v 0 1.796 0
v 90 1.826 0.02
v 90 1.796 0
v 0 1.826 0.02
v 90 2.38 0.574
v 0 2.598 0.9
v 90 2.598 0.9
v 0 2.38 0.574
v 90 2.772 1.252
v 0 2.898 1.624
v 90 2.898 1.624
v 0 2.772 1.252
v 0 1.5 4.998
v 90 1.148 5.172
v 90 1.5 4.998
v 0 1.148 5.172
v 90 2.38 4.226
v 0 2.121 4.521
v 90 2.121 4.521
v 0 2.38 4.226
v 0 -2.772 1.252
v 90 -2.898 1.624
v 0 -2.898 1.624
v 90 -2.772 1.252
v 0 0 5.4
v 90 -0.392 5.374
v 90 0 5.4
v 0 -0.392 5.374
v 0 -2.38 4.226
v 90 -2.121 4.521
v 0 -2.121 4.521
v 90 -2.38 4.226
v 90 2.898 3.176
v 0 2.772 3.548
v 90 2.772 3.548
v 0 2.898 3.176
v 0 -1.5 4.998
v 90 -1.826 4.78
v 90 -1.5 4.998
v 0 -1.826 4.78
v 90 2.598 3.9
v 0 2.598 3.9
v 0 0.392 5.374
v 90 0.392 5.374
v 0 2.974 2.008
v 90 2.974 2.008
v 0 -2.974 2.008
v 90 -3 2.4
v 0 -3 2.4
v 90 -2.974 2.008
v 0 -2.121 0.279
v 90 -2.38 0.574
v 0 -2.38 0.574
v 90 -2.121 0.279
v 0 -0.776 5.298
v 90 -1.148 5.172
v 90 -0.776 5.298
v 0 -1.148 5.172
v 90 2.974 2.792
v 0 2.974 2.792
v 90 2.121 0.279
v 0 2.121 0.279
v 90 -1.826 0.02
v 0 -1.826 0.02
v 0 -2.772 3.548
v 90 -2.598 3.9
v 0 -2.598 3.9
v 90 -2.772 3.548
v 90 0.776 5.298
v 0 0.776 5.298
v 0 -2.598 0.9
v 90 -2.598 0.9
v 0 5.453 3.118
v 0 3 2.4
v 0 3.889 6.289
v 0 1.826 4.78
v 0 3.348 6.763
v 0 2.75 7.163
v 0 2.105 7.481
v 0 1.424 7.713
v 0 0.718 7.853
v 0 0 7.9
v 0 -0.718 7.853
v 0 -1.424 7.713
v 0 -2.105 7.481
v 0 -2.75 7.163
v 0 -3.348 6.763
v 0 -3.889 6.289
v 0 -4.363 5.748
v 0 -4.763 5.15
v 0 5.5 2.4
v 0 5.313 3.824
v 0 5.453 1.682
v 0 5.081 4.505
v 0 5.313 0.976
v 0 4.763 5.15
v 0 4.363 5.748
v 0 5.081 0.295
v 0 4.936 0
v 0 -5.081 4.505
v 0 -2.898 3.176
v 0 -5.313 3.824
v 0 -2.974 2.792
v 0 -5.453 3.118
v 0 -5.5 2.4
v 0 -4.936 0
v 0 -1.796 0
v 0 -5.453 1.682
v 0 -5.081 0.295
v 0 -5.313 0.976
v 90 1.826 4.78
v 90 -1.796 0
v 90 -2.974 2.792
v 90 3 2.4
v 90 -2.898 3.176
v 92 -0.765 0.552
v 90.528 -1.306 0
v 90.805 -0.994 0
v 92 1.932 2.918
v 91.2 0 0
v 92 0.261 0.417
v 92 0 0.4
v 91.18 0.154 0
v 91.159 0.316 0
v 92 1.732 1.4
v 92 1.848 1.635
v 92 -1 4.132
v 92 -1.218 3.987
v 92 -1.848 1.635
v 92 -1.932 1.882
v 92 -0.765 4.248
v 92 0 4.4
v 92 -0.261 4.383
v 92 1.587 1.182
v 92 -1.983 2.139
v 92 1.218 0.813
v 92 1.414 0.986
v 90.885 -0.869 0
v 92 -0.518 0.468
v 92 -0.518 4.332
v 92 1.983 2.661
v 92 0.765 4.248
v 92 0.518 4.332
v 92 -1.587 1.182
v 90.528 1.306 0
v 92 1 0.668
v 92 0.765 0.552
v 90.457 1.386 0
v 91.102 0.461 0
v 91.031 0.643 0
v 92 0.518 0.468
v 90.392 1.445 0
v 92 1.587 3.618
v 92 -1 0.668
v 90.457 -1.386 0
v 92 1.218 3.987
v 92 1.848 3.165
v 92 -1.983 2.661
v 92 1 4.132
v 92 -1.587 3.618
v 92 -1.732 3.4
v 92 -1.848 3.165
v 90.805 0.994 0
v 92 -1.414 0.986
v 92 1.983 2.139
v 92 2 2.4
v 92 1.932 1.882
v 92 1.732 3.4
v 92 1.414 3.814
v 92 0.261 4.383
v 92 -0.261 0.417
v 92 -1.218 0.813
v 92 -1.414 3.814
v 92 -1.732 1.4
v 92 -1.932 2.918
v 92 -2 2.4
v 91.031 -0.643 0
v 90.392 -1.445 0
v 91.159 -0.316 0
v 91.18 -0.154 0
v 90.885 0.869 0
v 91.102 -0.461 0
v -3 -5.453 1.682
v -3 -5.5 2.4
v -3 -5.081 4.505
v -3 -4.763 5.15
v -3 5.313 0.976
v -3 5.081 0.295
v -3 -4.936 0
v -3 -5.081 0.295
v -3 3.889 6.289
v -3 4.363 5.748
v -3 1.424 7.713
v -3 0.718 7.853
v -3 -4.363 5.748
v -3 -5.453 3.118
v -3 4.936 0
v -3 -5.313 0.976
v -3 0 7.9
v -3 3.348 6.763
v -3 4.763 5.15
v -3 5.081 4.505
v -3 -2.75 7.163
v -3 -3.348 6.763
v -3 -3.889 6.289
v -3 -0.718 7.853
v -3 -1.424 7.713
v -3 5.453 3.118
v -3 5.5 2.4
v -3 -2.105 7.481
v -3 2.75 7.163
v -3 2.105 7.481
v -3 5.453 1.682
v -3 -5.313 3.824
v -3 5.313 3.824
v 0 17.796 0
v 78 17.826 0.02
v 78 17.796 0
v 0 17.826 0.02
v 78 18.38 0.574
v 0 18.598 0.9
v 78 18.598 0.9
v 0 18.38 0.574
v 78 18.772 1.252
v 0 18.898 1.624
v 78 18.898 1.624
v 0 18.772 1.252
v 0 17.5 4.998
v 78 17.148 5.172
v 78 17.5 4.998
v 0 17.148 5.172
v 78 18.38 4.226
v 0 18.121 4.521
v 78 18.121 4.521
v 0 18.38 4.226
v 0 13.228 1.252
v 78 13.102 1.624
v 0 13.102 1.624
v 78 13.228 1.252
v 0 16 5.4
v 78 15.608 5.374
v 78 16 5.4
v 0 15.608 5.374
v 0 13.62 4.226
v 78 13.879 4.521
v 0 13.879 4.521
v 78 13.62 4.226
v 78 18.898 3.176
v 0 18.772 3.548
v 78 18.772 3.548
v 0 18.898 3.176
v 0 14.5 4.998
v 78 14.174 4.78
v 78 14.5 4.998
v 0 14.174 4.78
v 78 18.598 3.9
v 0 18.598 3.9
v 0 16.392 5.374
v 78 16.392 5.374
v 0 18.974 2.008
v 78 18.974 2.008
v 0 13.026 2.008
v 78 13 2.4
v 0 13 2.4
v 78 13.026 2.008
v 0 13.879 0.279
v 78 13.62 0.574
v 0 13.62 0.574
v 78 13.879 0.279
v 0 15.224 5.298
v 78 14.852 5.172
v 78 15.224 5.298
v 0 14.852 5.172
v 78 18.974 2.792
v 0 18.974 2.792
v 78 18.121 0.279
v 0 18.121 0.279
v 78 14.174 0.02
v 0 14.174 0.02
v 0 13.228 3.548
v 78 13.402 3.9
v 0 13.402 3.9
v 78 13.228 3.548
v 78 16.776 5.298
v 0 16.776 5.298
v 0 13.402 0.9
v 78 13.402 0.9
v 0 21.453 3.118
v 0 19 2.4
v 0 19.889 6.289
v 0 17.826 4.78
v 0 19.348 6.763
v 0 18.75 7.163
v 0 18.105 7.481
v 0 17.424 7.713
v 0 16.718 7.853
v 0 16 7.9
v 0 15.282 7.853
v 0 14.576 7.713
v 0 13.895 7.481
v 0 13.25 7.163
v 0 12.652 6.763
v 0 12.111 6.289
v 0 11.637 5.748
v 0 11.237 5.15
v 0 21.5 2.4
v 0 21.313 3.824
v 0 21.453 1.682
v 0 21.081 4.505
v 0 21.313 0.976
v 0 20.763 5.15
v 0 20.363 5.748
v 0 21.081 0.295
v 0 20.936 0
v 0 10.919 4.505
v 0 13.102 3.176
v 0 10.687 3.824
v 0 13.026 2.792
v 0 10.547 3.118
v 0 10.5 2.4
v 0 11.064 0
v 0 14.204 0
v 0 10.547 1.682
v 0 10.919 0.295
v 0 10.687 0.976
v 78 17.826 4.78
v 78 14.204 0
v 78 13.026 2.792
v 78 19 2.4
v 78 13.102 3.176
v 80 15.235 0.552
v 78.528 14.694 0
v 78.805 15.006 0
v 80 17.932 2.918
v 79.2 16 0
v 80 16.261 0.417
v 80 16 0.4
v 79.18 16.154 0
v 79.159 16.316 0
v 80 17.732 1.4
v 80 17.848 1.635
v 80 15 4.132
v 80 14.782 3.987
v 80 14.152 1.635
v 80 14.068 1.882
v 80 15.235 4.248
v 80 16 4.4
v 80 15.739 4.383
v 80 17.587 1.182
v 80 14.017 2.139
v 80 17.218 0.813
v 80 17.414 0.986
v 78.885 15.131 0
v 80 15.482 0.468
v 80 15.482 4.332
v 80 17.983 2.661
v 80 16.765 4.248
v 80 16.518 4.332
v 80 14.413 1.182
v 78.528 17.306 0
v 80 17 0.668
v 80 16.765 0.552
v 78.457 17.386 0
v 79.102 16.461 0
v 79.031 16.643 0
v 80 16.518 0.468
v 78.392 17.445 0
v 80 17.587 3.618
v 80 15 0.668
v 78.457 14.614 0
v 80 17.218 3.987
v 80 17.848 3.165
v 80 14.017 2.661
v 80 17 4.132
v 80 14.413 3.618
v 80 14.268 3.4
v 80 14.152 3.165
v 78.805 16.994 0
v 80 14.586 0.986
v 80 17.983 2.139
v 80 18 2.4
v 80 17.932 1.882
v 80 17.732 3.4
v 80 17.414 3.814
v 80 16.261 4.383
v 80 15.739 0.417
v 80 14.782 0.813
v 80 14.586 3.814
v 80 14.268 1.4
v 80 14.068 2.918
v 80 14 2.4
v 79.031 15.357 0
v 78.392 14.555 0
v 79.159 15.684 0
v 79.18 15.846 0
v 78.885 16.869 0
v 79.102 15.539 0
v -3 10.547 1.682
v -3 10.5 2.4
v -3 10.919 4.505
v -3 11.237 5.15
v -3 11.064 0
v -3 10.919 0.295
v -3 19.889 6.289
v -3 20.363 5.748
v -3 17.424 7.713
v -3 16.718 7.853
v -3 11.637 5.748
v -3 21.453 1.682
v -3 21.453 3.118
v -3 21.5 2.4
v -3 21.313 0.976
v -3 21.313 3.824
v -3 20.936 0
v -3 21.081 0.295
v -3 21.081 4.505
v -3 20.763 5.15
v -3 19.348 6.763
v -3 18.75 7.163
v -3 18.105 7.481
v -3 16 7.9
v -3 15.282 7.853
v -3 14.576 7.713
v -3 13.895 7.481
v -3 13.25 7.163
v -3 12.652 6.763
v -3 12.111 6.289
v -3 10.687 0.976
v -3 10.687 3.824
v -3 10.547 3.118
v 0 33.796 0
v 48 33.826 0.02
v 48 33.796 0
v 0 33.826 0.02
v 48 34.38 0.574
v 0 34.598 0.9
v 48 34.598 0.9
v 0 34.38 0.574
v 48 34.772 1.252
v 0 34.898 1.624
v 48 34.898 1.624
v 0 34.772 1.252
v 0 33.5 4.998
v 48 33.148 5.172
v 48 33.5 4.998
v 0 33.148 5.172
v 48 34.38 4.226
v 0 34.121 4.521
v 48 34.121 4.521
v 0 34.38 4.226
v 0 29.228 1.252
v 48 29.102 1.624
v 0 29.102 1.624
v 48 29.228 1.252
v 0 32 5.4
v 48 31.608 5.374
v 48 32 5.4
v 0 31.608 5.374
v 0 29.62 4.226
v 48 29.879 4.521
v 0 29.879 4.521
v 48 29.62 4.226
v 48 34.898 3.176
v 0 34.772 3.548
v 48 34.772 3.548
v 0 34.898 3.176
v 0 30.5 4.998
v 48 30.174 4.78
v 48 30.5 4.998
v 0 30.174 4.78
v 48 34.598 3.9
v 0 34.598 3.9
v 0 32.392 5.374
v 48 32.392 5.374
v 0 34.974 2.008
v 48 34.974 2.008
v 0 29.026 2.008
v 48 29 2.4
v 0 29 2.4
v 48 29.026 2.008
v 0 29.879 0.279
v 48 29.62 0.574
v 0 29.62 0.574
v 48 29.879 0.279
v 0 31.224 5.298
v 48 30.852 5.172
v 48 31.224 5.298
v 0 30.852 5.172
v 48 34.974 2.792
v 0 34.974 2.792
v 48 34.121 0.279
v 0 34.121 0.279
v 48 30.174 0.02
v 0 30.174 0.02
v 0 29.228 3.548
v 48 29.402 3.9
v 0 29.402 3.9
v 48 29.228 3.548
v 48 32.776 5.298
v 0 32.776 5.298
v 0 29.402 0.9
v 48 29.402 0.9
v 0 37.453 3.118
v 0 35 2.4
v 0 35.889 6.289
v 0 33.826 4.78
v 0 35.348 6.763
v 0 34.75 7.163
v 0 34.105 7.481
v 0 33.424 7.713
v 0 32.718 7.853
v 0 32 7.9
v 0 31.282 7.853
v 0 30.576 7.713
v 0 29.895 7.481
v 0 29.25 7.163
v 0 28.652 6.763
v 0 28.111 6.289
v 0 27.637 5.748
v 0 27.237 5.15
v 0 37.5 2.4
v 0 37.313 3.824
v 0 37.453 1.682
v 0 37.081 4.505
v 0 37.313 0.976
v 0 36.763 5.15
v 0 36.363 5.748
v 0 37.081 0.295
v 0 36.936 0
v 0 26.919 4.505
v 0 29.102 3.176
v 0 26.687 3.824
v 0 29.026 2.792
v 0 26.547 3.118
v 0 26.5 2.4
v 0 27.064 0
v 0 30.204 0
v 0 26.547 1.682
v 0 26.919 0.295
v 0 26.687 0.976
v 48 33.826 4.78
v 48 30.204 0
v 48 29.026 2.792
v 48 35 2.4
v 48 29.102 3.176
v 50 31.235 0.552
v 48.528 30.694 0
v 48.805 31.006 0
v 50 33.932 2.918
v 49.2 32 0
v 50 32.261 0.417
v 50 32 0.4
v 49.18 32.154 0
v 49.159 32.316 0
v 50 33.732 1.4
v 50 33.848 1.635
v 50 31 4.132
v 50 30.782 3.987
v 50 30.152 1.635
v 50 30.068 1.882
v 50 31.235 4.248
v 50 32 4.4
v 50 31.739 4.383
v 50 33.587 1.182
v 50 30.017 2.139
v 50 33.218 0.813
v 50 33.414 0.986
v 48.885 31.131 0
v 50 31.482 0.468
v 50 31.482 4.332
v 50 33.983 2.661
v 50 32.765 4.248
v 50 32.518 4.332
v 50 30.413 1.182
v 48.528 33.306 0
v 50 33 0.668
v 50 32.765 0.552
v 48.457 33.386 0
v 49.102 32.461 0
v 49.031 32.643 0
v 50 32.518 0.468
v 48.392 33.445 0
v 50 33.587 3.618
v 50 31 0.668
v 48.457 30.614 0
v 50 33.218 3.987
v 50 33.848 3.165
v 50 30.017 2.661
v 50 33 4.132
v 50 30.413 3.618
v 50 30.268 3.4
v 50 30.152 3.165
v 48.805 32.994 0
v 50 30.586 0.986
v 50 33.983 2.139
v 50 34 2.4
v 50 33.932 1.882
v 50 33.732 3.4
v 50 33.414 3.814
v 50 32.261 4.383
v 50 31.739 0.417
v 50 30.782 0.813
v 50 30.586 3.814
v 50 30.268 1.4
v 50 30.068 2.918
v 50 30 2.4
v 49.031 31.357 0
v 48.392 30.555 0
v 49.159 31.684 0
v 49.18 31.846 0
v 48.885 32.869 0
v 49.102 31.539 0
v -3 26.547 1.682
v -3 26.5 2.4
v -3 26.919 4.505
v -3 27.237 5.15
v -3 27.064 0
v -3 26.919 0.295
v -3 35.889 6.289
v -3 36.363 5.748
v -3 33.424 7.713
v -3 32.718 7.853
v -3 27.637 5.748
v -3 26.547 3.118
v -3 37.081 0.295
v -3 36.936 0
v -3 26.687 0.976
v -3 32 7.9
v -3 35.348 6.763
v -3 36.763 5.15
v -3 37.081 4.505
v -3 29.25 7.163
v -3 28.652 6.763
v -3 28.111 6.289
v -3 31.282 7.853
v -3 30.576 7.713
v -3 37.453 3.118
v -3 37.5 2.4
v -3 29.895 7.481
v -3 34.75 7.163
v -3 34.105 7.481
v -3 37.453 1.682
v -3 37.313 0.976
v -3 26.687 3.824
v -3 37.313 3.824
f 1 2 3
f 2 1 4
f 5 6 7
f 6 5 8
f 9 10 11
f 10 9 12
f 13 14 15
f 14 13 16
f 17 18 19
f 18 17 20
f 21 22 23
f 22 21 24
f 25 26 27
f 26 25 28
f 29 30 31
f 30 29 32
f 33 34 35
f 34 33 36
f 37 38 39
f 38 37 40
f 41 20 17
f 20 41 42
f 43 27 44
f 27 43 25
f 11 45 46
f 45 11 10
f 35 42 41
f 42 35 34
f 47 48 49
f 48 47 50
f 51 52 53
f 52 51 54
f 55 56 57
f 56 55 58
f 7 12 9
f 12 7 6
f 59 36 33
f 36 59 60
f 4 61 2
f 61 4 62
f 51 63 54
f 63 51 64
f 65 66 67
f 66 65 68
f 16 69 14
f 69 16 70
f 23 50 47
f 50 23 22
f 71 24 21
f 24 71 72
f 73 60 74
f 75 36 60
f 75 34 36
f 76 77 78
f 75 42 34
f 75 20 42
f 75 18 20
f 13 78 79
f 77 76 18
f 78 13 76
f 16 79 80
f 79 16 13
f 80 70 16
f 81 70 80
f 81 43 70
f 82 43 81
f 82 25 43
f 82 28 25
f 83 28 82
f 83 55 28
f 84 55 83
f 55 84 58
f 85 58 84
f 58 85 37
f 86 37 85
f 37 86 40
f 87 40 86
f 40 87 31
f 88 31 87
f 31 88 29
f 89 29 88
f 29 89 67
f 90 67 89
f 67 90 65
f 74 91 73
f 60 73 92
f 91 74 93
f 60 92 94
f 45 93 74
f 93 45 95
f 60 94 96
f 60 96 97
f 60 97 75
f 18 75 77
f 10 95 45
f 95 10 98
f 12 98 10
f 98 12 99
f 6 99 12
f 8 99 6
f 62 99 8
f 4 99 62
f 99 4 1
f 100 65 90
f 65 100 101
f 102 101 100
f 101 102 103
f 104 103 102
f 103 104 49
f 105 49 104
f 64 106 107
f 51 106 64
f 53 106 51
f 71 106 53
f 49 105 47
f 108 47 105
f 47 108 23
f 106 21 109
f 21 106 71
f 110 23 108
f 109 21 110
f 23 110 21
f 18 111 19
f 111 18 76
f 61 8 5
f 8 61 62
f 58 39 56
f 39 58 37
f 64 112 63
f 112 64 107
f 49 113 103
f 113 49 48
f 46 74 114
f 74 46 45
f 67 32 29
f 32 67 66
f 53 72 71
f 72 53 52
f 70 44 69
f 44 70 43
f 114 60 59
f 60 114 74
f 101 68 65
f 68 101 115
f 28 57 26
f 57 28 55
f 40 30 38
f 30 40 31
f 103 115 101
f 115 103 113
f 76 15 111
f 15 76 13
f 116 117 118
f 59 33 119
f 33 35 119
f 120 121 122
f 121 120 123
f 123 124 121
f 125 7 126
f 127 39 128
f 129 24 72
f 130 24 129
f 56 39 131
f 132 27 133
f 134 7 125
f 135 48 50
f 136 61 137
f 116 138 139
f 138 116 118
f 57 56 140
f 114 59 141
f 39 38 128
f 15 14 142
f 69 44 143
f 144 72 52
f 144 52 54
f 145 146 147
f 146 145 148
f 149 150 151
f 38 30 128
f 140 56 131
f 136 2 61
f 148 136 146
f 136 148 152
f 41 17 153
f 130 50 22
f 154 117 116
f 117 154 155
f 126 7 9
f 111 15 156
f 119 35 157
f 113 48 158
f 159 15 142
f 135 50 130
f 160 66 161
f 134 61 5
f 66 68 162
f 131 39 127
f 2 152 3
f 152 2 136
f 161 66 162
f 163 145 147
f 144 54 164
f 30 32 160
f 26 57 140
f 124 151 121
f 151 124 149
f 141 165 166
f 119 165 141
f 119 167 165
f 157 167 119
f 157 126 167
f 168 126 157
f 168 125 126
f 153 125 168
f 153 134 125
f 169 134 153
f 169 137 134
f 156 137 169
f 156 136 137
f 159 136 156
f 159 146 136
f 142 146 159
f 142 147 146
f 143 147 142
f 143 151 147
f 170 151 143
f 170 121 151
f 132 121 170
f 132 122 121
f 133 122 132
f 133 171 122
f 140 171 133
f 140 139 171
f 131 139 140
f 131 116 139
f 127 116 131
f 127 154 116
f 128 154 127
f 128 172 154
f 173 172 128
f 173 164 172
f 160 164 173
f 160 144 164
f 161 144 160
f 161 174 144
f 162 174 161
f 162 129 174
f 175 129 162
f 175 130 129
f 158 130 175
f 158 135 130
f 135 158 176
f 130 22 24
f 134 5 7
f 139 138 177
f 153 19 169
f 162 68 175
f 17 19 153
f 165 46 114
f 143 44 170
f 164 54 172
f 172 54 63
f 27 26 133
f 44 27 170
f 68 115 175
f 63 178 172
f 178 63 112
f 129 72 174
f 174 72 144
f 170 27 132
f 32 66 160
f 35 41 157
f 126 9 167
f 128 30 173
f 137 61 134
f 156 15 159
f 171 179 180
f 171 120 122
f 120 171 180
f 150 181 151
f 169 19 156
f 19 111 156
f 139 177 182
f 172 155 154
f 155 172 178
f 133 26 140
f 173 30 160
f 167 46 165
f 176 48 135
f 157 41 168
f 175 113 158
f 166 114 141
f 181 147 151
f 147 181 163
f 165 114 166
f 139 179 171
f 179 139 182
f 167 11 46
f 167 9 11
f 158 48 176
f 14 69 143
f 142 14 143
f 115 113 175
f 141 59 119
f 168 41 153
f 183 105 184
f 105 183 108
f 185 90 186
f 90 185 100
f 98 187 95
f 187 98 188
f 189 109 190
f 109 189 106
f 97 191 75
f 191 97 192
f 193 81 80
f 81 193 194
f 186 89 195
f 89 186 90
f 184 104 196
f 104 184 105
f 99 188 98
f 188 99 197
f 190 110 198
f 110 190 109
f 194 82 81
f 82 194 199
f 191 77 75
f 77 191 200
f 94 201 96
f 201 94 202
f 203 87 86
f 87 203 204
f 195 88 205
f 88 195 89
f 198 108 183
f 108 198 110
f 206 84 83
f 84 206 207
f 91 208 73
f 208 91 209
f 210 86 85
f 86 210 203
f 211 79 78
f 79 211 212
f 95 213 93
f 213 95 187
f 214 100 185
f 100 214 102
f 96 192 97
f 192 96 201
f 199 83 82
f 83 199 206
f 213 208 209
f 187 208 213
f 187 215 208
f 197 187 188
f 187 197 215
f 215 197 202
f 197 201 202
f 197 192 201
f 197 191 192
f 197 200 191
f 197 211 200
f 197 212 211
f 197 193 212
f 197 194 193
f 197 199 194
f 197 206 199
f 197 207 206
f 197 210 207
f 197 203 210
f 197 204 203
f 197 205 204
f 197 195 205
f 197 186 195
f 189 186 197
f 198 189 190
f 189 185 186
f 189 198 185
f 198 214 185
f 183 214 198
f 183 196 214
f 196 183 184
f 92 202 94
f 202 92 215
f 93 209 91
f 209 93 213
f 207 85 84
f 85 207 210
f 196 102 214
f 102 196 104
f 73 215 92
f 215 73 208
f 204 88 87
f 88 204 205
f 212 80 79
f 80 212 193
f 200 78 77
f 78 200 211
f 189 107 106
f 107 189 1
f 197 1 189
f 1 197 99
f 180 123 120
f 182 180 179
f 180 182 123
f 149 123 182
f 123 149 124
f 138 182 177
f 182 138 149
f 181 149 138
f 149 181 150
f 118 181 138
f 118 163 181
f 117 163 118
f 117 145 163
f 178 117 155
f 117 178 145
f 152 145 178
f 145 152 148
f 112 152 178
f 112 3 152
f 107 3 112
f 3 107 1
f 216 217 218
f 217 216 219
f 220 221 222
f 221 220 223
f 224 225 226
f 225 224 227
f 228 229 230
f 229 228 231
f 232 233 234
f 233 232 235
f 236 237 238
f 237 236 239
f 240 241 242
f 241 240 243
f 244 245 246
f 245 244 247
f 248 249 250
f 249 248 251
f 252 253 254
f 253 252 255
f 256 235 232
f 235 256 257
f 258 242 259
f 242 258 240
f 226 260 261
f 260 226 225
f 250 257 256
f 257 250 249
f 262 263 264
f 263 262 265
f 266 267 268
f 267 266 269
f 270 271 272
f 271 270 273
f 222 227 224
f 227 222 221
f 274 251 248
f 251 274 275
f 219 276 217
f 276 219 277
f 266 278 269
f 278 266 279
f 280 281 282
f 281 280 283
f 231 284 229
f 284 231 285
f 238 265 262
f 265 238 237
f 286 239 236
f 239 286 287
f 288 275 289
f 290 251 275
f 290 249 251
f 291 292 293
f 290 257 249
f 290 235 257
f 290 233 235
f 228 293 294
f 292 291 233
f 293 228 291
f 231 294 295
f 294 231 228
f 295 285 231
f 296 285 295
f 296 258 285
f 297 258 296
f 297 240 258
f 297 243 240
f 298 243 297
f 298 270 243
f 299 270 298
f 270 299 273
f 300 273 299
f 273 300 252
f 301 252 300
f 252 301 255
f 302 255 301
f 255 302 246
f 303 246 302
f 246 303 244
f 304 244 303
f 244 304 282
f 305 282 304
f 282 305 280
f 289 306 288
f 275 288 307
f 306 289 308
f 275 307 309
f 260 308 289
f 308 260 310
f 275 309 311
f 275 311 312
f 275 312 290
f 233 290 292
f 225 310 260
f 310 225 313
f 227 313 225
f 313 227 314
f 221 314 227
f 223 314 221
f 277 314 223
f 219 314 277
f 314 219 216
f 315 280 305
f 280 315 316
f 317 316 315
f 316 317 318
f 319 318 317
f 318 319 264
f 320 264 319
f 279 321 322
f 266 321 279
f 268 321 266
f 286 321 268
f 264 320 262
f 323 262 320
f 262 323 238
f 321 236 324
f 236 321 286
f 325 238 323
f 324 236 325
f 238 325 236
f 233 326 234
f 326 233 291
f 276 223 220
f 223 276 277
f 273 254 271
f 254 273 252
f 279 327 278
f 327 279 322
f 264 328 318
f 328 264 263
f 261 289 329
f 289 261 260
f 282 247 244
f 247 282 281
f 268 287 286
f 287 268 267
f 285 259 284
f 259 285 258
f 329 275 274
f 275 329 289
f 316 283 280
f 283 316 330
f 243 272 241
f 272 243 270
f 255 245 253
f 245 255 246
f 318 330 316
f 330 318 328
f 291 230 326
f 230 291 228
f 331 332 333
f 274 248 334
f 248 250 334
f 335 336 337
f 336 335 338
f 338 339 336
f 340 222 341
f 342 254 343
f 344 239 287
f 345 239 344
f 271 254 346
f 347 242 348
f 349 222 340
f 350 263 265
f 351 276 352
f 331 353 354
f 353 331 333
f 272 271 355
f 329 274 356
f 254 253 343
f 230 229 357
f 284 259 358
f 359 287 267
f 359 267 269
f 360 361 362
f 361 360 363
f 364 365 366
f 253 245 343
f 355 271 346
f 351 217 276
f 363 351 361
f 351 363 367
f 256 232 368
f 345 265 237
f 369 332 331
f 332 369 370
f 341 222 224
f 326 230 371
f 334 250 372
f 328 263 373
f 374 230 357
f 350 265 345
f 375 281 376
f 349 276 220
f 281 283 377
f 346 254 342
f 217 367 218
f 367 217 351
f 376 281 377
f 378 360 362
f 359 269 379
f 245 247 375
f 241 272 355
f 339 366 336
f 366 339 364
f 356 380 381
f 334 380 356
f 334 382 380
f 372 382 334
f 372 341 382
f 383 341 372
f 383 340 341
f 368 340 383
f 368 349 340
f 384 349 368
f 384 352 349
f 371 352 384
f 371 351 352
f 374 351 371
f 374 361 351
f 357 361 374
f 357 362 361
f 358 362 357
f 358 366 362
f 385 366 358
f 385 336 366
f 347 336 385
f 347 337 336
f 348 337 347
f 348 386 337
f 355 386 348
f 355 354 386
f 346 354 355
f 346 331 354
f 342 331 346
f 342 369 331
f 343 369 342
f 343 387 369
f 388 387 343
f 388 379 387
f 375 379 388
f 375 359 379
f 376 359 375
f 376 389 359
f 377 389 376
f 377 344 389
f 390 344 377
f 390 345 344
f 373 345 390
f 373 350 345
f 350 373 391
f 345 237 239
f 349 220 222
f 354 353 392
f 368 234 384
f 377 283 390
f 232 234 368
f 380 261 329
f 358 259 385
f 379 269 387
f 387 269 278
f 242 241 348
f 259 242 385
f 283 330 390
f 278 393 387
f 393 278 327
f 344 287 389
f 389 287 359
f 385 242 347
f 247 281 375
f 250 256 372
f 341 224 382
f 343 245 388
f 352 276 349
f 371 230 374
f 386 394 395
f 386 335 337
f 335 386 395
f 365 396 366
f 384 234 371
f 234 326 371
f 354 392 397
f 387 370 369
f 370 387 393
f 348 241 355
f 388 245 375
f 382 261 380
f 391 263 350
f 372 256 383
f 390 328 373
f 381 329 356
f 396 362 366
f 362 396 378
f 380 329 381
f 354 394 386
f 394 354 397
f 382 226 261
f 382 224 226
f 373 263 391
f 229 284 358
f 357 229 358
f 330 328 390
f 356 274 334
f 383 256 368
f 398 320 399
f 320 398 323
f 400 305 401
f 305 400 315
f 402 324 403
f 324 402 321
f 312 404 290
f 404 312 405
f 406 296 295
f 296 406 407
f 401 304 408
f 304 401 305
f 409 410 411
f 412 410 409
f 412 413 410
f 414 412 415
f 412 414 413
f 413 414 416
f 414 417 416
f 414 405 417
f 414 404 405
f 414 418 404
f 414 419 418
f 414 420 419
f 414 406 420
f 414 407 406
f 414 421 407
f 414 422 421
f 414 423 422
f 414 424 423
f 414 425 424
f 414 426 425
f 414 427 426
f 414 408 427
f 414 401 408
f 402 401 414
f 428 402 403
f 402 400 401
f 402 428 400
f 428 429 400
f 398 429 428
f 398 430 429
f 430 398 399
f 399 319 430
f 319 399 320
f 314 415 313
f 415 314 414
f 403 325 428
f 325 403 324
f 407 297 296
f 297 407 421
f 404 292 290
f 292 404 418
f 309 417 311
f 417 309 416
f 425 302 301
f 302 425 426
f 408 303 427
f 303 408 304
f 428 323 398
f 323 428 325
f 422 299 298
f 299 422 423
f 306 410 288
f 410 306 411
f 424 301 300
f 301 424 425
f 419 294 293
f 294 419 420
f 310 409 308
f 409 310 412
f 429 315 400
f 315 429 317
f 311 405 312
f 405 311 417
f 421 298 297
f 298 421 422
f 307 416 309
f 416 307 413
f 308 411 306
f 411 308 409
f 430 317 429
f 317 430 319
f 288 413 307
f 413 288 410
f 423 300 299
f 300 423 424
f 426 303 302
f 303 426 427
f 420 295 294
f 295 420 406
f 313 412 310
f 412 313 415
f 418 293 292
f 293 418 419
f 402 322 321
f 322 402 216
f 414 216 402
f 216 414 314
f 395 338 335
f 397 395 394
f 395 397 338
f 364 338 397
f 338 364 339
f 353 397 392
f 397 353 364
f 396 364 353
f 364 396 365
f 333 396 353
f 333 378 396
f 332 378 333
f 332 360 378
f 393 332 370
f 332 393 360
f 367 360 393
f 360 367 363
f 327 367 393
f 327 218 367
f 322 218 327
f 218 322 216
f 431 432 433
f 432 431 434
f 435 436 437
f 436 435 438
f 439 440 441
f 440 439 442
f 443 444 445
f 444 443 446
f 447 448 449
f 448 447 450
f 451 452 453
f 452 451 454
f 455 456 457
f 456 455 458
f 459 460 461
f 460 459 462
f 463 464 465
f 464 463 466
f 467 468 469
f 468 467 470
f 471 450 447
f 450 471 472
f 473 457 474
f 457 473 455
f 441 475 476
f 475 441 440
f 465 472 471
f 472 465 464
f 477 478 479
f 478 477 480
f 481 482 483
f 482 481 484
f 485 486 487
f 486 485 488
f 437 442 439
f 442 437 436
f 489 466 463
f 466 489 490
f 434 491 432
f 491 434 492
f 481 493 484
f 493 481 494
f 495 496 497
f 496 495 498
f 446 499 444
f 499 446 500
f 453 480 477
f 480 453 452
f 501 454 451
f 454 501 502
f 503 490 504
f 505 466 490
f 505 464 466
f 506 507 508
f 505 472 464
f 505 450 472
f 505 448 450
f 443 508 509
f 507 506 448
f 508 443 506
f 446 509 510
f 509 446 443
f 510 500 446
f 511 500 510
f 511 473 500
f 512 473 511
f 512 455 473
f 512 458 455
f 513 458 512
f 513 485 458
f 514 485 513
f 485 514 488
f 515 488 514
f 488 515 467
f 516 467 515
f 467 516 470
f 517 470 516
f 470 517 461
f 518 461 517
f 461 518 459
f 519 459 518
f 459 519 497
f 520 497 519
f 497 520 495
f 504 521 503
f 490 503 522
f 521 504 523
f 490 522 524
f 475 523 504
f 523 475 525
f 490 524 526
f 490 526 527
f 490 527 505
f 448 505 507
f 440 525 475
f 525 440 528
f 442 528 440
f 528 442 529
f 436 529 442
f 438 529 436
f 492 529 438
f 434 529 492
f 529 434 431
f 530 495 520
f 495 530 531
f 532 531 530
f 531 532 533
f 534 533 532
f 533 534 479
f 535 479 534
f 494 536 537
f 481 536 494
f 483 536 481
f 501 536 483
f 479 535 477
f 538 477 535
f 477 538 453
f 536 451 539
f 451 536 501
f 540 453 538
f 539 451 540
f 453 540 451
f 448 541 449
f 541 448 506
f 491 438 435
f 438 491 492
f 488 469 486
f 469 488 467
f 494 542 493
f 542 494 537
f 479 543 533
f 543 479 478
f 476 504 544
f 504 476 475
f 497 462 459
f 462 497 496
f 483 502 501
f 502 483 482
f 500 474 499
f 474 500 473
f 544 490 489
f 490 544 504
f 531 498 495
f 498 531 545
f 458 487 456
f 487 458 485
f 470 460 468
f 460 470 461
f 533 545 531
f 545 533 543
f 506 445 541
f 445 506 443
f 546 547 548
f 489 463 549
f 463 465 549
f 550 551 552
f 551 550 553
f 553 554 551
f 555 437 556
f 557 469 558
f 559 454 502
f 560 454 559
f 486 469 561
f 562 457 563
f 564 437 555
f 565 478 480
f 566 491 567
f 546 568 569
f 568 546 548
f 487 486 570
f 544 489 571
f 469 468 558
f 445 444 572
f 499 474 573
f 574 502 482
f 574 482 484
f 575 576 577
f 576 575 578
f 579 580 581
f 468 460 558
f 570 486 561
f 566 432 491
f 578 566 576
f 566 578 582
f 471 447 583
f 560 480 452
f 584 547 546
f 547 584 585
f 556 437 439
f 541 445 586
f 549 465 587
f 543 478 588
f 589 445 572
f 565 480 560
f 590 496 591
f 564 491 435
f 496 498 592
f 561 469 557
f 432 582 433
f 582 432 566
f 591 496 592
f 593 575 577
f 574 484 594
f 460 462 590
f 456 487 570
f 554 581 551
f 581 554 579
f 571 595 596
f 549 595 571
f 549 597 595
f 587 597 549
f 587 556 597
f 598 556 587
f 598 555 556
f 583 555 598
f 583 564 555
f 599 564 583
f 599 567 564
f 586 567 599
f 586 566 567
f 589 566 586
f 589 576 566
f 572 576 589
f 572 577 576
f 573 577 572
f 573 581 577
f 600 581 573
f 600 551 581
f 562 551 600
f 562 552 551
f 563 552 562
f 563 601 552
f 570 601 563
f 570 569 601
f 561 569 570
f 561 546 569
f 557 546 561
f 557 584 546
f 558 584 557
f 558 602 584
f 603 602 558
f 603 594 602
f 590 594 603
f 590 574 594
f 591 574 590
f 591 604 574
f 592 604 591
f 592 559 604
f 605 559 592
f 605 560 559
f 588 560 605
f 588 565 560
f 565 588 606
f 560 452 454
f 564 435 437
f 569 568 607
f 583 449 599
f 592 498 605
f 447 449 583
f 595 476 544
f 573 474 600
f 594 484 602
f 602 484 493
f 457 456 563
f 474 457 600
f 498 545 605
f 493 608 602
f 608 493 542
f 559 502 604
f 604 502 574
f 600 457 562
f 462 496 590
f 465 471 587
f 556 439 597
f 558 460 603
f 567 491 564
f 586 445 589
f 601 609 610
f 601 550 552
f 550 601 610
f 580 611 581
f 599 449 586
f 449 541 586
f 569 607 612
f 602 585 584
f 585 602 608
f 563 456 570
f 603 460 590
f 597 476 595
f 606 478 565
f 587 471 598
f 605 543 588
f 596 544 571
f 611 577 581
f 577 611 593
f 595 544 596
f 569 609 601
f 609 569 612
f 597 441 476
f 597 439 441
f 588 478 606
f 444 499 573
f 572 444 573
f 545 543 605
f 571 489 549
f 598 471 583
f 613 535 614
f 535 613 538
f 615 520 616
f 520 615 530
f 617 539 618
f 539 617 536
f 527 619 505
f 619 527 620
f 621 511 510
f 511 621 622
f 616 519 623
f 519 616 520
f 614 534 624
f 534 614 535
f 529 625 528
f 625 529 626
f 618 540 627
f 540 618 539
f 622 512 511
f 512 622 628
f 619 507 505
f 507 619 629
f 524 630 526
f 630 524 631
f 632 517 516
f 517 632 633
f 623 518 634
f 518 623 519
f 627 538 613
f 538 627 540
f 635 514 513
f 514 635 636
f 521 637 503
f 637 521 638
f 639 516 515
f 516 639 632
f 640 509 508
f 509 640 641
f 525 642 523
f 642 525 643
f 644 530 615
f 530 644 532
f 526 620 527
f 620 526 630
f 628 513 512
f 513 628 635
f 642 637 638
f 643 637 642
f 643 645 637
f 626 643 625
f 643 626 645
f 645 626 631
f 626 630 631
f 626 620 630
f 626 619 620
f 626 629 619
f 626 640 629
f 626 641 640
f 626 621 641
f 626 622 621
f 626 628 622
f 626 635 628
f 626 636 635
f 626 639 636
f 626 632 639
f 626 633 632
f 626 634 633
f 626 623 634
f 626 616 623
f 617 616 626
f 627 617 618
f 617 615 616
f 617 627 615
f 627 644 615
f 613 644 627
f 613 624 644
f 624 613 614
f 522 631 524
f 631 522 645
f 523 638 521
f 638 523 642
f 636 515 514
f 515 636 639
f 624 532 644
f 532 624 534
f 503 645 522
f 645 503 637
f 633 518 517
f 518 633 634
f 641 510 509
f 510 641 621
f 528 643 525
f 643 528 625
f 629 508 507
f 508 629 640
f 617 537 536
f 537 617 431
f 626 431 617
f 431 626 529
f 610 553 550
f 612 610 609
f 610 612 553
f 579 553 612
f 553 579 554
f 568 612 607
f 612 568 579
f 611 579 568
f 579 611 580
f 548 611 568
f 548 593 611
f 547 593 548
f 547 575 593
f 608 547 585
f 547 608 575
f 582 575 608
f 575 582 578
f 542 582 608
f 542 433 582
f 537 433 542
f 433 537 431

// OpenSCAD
// =====================================================================
//  PIEZAS 6, 7 y 8 de 8 — LOS TRES PASADORES
//  Son los que traban cada encastre. Salen los tres juntos en un solo
//  STL, acostados, con una cara plana abajo para que peguen a la cama.
//
//  Abrir con OpenSCAD -> F6 -> F7 -> guardar STL.  No hay que tocar nada.
//
//  IMPRESION: tal cual salen. 100% de relleno, 0.16 mm de capa.
//   Sin soportes. ~10 g los tres. Imprimi 2 juegos, alguno se rompe.
//
//  CUAL VA DONDE (van marcados por el largo)
//   92 mm -> tapa de hombro    (pieza 2 + pieza 3)
//   80 mm -> union del humero  (pieza 1 + pieza 2)
//   50 mm -> tapa de muñeca    (pieza 4 + pieza 5)
//
//  Si un pasador entra muy forzado, lijalo un poco. Si queda flojo,
//  pasale una vuelta de cinta o una bandita elastica alrededor de la
//  cabeza y la punta. NO usar calor ni pegamento.
// =====================================================================

$fn = 48;

d_pasador_impreso = 6.0;   // el agujero es de 6.4
d_cabeza = 11;
esp_cabeza = 3;
plano = 0.6;               // cara plana para apoyar en la cama

// largos = 2 * radio exterior del hueso en ese punto + 8 mm
largos = [92, 80, 50];

module pasador(L) {
    intersection() {
        translate([0, 0, d_pasador_impreso/2 - plano])
            rotate([0, 90, 0]) union() {
                // cuerpo con punta achaflanada
                cylinder(d = d_pasador_impreso, h = L - 2);
                translate([0, 0, L - 2]) cylinder(d1 = d_pasador_impreso, d2 = d_pasador_impreso - 2, h = 2);
                // cabeza
                translate([0, 0, -esp_cabeza]) cylinder(d = d_cabeza, h = esp_cabeza);
            }
        translate([-10, -10, 0]) cube([L + 20, 20, 20]);
    }
}

for (i = [0 : len(largos) - 1])
    translate([0, i * 16, 0]) pasador(largos[i]);
